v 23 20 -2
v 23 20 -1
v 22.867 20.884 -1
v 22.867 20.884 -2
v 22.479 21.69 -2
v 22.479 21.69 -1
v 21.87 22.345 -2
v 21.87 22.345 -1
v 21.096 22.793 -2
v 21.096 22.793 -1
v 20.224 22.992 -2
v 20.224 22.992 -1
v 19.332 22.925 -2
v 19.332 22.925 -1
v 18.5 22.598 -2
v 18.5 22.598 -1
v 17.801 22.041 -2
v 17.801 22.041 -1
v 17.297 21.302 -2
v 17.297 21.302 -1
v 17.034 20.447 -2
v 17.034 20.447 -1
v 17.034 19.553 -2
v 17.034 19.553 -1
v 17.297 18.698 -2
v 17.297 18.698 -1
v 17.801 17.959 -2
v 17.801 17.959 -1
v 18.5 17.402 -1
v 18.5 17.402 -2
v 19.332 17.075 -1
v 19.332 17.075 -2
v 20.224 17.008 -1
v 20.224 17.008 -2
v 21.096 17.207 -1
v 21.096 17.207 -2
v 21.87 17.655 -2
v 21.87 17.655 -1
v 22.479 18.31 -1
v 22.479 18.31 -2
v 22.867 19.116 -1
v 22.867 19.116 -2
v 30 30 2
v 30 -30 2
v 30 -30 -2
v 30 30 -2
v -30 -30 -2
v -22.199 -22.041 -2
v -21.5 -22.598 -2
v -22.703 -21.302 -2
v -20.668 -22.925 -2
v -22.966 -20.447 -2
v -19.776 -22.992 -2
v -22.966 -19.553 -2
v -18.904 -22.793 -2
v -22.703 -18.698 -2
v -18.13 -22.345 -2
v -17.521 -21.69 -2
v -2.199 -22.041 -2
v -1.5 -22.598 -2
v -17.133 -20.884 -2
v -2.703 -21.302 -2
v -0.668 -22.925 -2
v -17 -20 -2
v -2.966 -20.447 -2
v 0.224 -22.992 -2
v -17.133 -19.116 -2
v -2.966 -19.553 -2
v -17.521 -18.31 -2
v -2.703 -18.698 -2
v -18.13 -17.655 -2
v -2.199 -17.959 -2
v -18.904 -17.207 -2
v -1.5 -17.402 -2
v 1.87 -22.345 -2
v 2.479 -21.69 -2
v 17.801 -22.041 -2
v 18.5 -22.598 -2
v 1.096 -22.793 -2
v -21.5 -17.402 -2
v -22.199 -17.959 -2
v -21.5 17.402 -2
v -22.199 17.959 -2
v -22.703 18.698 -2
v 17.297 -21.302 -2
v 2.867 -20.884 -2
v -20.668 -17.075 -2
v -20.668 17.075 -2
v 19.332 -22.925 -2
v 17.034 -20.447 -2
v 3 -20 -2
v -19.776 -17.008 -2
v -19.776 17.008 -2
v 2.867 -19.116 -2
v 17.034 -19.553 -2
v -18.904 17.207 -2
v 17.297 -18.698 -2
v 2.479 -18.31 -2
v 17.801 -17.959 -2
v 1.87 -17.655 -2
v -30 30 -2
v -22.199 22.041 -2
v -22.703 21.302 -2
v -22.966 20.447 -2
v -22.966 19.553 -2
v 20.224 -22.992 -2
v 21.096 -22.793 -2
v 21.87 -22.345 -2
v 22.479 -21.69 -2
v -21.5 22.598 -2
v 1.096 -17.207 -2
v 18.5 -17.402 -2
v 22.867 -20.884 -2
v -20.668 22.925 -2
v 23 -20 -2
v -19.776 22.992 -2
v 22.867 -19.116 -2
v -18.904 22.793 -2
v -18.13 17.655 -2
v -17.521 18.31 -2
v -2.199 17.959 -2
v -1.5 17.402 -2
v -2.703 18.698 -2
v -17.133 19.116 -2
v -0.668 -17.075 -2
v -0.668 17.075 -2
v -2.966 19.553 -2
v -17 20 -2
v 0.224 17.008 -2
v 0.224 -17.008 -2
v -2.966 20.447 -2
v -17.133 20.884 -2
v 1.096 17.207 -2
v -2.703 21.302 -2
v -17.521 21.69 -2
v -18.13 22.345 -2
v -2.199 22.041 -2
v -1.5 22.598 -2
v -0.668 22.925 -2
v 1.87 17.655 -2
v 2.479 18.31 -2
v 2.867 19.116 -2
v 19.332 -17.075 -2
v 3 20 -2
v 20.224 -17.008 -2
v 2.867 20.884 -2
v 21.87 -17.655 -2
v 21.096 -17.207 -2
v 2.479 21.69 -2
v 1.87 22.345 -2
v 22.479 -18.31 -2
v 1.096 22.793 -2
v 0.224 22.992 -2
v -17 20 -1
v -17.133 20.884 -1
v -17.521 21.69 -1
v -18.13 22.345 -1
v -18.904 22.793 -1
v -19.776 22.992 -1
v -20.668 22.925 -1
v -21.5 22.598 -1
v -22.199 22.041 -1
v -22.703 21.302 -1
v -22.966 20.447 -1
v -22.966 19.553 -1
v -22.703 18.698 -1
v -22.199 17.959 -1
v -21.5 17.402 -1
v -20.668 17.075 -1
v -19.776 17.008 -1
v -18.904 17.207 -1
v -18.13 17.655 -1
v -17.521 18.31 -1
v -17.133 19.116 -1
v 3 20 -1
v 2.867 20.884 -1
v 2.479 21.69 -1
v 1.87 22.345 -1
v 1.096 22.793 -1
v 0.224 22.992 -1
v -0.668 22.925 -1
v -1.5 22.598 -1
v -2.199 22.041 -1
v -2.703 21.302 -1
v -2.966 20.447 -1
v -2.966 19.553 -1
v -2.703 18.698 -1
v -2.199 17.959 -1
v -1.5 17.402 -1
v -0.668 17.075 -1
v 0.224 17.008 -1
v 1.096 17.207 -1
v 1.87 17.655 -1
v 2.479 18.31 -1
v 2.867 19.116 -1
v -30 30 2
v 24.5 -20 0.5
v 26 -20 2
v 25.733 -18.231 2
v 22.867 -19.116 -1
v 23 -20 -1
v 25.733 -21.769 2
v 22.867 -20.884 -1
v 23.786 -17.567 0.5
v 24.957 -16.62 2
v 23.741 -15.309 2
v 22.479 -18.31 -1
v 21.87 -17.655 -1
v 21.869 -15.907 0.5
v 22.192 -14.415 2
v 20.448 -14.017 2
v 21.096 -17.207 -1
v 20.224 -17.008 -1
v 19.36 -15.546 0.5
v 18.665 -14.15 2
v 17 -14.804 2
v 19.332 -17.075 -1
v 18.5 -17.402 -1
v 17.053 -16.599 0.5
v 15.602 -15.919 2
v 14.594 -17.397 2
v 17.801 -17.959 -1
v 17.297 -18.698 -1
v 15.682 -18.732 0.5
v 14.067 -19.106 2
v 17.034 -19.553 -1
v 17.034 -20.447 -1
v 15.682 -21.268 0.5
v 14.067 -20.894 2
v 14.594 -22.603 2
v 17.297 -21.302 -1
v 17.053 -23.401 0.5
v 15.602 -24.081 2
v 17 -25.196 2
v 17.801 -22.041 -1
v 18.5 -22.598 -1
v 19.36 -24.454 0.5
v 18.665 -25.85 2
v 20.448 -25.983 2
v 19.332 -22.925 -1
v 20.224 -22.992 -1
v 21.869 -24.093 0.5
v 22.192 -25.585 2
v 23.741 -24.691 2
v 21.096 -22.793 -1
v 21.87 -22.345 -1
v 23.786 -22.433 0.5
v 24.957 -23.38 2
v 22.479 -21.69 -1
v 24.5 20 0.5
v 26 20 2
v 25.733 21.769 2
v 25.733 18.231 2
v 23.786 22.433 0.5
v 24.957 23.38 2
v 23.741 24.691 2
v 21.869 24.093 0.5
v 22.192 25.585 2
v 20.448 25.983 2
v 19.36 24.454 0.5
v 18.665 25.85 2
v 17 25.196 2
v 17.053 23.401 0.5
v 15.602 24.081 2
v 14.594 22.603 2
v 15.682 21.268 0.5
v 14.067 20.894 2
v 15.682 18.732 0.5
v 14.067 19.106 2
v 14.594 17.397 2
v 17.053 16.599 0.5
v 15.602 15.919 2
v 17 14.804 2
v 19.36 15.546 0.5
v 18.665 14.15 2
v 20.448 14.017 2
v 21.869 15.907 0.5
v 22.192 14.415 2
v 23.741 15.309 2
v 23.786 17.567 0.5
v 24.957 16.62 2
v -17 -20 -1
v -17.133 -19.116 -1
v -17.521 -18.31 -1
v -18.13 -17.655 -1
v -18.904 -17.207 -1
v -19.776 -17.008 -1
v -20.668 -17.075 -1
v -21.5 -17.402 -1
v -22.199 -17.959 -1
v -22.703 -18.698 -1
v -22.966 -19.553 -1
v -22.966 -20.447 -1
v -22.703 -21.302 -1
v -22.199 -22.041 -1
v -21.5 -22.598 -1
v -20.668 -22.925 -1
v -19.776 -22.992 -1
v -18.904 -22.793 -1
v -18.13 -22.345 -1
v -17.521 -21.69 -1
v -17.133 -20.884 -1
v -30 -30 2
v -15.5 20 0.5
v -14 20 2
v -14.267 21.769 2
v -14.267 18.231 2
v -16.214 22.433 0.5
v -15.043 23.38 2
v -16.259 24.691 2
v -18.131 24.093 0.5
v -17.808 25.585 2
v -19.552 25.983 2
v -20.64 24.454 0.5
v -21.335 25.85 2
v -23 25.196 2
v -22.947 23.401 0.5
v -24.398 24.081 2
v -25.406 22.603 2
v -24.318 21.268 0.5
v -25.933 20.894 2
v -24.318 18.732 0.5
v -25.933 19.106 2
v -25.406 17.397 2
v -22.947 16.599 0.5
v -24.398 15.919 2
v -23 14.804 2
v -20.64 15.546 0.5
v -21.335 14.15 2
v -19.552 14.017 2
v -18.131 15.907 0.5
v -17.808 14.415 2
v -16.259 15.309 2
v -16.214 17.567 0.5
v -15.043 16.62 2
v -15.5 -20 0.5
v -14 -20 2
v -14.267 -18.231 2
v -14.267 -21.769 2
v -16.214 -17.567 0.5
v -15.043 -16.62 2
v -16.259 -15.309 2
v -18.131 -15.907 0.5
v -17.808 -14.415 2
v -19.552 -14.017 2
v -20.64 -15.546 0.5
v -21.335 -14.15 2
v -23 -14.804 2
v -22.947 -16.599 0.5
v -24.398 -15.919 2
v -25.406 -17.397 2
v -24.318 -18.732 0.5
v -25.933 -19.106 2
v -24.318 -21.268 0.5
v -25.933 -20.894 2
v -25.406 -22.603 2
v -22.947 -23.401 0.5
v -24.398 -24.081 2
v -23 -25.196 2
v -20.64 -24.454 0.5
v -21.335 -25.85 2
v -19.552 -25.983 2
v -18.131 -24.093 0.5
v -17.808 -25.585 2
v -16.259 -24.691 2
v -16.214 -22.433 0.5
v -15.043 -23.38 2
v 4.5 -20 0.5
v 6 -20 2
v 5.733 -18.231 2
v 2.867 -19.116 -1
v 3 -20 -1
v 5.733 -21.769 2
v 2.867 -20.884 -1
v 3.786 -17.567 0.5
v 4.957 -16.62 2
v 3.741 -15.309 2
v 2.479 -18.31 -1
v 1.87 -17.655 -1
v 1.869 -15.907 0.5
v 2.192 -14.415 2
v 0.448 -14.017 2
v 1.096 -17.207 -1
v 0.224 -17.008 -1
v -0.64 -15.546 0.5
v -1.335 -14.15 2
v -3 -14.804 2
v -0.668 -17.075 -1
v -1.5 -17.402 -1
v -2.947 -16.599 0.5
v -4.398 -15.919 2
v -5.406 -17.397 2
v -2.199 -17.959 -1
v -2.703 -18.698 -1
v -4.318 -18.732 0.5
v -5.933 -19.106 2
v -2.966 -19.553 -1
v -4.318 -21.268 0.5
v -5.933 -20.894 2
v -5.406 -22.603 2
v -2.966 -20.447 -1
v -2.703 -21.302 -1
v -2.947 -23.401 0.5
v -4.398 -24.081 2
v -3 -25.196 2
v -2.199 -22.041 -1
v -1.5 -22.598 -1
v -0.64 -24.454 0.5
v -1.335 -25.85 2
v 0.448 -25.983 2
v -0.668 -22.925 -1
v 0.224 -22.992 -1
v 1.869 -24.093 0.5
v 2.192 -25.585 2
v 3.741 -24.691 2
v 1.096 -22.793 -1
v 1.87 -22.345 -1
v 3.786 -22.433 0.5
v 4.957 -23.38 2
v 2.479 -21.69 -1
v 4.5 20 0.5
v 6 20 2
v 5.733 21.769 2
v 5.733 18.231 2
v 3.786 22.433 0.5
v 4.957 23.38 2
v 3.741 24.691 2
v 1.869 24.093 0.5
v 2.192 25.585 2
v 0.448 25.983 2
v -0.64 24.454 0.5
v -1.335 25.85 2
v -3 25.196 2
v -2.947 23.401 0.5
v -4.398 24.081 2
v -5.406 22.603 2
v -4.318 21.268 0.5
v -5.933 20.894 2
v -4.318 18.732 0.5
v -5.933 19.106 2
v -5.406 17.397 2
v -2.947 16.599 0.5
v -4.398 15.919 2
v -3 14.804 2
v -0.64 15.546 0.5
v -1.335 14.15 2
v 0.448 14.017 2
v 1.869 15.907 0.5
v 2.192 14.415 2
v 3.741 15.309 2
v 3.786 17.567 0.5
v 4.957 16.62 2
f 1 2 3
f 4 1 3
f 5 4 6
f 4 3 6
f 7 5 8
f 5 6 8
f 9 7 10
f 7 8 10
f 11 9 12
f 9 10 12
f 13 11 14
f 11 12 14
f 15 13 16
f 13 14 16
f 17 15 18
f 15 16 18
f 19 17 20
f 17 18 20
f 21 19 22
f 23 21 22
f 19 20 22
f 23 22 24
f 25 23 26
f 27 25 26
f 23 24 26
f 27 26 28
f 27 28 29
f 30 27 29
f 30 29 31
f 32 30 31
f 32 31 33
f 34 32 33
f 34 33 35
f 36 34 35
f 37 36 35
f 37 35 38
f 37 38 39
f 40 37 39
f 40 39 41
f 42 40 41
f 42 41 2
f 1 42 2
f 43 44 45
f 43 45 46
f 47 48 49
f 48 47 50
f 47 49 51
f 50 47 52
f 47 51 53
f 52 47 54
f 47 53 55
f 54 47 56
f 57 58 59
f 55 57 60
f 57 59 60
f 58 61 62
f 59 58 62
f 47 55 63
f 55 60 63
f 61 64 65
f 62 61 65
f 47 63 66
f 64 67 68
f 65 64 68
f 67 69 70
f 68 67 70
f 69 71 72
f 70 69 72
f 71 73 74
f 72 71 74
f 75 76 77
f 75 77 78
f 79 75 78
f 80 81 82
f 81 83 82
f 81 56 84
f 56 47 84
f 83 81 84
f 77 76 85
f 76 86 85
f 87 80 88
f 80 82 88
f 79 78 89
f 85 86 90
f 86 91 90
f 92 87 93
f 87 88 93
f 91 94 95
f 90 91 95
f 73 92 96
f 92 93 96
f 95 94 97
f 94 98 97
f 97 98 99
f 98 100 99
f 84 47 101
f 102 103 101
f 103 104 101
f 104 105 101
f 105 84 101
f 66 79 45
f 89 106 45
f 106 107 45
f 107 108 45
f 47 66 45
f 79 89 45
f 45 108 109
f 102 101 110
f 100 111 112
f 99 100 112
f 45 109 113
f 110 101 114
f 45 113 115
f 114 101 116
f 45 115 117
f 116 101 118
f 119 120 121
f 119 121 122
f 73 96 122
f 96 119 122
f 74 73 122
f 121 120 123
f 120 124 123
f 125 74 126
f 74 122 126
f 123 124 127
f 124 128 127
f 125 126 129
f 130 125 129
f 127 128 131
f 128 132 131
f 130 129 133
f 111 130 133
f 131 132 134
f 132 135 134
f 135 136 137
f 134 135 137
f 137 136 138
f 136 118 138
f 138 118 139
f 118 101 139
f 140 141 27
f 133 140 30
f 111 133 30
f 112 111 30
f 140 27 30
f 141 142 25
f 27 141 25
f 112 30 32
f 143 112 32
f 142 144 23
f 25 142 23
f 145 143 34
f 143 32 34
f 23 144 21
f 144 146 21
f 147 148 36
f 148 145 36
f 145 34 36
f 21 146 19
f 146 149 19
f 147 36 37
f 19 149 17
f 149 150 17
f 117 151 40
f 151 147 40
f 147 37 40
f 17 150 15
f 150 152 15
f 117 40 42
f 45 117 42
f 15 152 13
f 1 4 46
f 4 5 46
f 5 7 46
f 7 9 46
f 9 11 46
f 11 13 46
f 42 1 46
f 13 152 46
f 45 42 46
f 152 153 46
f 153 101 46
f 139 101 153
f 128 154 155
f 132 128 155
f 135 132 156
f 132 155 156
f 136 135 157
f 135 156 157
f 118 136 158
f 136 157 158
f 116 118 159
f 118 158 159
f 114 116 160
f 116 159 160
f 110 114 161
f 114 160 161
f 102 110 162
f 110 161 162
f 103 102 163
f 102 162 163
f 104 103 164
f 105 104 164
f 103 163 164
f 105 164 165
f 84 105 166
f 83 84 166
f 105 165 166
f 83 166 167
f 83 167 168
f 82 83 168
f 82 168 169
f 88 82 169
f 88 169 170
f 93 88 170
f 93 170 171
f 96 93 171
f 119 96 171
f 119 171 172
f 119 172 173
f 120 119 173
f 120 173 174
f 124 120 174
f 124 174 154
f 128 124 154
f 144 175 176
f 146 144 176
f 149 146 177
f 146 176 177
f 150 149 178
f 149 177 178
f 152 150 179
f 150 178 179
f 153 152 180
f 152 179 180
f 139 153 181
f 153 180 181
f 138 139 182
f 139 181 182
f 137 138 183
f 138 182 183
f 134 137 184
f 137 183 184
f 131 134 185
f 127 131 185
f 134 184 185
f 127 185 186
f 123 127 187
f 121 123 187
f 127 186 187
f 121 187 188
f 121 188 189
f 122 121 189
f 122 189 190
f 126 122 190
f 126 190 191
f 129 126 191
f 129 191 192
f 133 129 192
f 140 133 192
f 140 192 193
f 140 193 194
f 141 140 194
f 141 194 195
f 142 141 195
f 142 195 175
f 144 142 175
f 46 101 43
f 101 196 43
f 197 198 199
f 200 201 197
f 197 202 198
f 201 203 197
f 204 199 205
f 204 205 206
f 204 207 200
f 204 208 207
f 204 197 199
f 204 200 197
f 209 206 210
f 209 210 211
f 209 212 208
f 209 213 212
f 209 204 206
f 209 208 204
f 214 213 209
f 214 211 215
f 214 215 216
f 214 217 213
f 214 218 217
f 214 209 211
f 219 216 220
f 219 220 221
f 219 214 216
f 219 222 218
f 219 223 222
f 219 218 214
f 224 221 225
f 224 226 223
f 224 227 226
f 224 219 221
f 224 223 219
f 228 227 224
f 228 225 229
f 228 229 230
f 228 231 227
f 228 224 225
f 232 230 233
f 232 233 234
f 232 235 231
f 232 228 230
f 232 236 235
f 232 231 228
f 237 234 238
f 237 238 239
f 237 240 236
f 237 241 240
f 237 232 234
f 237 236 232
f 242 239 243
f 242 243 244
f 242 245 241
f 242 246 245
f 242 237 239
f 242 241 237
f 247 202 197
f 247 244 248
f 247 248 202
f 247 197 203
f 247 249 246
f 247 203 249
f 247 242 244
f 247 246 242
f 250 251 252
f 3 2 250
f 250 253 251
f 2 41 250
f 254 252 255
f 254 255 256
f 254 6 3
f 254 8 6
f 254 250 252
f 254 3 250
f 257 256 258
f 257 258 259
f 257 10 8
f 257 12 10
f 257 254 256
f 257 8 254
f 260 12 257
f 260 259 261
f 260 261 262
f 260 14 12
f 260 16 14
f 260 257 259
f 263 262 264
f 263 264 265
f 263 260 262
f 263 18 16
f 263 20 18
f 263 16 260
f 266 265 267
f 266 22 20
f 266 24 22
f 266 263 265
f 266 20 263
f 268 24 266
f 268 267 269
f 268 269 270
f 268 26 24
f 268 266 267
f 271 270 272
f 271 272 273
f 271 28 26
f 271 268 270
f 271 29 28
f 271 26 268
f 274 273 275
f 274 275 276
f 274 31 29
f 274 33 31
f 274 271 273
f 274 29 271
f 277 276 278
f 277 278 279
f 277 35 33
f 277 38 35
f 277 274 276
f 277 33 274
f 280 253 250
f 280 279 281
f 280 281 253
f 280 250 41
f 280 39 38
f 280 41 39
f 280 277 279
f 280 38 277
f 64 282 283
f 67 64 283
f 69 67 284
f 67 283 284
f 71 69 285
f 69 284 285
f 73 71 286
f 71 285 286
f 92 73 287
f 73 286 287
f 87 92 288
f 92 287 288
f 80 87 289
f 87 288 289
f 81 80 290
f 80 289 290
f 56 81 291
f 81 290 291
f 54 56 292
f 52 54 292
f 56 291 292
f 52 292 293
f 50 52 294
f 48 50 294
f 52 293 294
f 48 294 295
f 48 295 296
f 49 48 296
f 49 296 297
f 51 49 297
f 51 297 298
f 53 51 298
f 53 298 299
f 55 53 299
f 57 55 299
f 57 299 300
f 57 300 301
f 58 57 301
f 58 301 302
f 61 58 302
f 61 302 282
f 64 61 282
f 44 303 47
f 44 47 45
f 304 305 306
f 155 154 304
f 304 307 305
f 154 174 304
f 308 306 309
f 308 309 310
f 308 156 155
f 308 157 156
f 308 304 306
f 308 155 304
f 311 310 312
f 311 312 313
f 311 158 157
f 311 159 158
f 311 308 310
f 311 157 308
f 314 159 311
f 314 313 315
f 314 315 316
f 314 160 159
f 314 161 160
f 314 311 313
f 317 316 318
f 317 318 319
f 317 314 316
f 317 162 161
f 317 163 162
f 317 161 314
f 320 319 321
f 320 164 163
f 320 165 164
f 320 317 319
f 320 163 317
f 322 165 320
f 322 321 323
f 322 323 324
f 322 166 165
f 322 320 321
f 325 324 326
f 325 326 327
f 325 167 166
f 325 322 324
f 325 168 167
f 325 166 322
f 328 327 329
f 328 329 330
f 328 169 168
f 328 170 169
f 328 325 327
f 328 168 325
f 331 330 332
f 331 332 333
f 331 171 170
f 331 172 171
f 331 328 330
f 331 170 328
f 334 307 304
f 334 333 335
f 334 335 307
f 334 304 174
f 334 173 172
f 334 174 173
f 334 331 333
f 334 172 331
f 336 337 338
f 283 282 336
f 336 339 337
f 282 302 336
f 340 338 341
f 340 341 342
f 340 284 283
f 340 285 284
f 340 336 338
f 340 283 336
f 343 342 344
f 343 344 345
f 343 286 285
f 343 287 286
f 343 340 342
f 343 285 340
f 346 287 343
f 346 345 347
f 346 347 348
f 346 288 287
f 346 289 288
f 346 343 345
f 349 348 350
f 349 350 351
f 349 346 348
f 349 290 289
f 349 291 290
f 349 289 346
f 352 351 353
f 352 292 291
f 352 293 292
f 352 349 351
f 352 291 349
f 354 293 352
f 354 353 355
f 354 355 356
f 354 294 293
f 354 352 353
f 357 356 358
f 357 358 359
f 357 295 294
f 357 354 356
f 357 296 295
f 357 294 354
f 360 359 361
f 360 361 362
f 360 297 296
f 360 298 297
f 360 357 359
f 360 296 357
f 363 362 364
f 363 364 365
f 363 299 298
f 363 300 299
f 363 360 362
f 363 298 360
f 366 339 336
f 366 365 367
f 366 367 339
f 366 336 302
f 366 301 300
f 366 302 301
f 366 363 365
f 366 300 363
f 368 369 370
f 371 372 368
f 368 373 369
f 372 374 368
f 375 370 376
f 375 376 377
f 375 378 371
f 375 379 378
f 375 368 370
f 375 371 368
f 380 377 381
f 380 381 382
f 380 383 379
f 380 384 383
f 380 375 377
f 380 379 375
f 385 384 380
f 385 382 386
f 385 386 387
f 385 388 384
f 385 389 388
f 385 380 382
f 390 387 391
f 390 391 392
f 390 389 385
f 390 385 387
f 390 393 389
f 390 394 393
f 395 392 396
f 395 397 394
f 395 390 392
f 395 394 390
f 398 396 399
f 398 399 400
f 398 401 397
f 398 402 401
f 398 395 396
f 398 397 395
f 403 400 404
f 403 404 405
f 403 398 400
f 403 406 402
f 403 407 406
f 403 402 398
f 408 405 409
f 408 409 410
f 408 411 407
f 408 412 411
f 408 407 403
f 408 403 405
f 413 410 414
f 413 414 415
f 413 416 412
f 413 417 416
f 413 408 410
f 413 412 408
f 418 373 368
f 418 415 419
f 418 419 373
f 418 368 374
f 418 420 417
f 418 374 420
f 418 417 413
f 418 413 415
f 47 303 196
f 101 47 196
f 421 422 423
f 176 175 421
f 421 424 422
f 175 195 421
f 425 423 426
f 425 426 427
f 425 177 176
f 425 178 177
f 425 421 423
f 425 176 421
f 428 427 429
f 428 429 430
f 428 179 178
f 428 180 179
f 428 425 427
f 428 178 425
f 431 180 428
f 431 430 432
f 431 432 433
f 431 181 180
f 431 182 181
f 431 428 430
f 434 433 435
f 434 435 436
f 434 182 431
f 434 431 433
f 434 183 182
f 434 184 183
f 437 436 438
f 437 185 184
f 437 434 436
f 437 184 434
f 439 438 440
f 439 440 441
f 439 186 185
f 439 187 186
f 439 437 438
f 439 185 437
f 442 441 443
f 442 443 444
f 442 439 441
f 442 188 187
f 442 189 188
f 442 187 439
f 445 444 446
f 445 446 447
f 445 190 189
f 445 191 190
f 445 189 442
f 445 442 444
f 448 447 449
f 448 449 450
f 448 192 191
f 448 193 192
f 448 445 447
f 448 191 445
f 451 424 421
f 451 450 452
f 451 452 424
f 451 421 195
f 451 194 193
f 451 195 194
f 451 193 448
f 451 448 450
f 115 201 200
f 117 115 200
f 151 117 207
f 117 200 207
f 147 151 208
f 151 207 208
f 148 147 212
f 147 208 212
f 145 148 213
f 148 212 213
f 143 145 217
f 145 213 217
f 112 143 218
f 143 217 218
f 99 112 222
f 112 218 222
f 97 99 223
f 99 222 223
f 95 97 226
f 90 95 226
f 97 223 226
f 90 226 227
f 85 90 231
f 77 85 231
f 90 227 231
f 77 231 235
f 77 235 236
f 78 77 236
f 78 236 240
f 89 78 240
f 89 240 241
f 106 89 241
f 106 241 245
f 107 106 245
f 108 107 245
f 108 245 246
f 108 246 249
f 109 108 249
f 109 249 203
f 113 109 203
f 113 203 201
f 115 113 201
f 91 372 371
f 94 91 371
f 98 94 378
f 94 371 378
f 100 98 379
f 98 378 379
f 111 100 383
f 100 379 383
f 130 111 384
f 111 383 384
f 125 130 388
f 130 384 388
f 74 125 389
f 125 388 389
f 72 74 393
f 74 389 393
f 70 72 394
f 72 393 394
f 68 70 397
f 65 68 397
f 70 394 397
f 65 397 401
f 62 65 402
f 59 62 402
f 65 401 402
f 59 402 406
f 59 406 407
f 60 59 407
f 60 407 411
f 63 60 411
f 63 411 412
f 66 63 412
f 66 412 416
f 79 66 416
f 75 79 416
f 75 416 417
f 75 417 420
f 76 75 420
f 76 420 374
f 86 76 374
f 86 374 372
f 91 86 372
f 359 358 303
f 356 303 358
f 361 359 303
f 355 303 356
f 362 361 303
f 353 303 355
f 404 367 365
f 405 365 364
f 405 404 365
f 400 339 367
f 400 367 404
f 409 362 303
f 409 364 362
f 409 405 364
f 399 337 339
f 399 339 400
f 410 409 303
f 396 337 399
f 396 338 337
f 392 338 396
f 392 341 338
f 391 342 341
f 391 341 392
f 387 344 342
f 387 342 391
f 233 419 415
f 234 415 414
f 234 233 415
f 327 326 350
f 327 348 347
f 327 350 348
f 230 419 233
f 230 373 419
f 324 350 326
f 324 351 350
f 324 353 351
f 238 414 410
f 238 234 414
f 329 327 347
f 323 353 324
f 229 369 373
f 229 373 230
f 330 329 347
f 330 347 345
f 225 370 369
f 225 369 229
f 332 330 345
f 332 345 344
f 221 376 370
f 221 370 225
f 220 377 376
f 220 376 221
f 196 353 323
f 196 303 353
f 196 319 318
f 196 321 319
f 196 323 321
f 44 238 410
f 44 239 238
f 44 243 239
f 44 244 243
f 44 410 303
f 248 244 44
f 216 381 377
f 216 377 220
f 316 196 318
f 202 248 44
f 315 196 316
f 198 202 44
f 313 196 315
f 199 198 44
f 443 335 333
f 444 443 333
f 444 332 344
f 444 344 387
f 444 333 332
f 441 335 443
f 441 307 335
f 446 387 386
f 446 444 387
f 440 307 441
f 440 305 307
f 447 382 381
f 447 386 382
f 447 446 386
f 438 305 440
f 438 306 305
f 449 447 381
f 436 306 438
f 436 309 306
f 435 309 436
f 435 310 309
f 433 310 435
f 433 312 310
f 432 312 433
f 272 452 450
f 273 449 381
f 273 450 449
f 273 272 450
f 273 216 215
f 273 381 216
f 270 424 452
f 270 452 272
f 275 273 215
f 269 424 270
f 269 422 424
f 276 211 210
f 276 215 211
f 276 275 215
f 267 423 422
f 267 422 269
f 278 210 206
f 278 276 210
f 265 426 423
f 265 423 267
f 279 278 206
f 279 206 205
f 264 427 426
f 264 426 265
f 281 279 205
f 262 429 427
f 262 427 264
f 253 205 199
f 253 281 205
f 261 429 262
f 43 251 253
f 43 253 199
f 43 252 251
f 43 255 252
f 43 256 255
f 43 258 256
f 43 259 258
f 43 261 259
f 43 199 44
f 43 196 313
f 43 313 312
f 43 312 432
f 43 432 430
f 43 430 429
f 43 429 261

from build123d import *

# Parameters (mm, degrees)
SKETCH1_W           = 60
SKETCH1_H           = 60
BOSS_EXTRUDE1_DEPTH = 2
SKETCH2_R           = 3
CUT_EXTRUDE1_DEPTH  = 5
CHAMFER1_SIZE       = 3


with BuildPart() as part:
    # Sketch1 → Boss-Extrude1 (new body, symmetric)
    with BuildSketch(Plane.XY):
        Rectangle(SKETCH1_W, SKETCH1_H)
    extrude(amount=BOSS_EXTRUDE1_DEPTH, both=True)

    # Sketch2 → Cut-Extrude1 (cut, through all)
    with BuildSketch(Plane.XY.offset(2)):
        with Locations((0, 20)):
            Circle(SKETCH2_R)
        with Locations((0, -20)):
            Circle(SKETCH2_R)
        with Locations((20, -20)):
            Circle(SKETCH2_R)
        with Locations((-20, -20)):
            Circle(SKETCH2_R)
        with Locations((-20, 20)):
            Circle(SKETCH2_R)
        with Locations((20, 20)):
            Circle(SKETCH2_R)
    extrude(amount=-CUT_EXTRUDE1_DEPTH, mode=Mode.SUBTRACT)

    # Chamfer1
    chamfer1_edges = [part.edges().sort_by_distance(p)[0] for p in [
        (-3, -20, 2),
        (17, -20, 2),
        (-23, -20, 2),
        (-23, 20, 2),
        (17, 20, 2),
        (-3, 20, 2),
    ]]
    chamfer(chamfer1_edges, length=CHAMFER1_SIZE)


solid = part.part
